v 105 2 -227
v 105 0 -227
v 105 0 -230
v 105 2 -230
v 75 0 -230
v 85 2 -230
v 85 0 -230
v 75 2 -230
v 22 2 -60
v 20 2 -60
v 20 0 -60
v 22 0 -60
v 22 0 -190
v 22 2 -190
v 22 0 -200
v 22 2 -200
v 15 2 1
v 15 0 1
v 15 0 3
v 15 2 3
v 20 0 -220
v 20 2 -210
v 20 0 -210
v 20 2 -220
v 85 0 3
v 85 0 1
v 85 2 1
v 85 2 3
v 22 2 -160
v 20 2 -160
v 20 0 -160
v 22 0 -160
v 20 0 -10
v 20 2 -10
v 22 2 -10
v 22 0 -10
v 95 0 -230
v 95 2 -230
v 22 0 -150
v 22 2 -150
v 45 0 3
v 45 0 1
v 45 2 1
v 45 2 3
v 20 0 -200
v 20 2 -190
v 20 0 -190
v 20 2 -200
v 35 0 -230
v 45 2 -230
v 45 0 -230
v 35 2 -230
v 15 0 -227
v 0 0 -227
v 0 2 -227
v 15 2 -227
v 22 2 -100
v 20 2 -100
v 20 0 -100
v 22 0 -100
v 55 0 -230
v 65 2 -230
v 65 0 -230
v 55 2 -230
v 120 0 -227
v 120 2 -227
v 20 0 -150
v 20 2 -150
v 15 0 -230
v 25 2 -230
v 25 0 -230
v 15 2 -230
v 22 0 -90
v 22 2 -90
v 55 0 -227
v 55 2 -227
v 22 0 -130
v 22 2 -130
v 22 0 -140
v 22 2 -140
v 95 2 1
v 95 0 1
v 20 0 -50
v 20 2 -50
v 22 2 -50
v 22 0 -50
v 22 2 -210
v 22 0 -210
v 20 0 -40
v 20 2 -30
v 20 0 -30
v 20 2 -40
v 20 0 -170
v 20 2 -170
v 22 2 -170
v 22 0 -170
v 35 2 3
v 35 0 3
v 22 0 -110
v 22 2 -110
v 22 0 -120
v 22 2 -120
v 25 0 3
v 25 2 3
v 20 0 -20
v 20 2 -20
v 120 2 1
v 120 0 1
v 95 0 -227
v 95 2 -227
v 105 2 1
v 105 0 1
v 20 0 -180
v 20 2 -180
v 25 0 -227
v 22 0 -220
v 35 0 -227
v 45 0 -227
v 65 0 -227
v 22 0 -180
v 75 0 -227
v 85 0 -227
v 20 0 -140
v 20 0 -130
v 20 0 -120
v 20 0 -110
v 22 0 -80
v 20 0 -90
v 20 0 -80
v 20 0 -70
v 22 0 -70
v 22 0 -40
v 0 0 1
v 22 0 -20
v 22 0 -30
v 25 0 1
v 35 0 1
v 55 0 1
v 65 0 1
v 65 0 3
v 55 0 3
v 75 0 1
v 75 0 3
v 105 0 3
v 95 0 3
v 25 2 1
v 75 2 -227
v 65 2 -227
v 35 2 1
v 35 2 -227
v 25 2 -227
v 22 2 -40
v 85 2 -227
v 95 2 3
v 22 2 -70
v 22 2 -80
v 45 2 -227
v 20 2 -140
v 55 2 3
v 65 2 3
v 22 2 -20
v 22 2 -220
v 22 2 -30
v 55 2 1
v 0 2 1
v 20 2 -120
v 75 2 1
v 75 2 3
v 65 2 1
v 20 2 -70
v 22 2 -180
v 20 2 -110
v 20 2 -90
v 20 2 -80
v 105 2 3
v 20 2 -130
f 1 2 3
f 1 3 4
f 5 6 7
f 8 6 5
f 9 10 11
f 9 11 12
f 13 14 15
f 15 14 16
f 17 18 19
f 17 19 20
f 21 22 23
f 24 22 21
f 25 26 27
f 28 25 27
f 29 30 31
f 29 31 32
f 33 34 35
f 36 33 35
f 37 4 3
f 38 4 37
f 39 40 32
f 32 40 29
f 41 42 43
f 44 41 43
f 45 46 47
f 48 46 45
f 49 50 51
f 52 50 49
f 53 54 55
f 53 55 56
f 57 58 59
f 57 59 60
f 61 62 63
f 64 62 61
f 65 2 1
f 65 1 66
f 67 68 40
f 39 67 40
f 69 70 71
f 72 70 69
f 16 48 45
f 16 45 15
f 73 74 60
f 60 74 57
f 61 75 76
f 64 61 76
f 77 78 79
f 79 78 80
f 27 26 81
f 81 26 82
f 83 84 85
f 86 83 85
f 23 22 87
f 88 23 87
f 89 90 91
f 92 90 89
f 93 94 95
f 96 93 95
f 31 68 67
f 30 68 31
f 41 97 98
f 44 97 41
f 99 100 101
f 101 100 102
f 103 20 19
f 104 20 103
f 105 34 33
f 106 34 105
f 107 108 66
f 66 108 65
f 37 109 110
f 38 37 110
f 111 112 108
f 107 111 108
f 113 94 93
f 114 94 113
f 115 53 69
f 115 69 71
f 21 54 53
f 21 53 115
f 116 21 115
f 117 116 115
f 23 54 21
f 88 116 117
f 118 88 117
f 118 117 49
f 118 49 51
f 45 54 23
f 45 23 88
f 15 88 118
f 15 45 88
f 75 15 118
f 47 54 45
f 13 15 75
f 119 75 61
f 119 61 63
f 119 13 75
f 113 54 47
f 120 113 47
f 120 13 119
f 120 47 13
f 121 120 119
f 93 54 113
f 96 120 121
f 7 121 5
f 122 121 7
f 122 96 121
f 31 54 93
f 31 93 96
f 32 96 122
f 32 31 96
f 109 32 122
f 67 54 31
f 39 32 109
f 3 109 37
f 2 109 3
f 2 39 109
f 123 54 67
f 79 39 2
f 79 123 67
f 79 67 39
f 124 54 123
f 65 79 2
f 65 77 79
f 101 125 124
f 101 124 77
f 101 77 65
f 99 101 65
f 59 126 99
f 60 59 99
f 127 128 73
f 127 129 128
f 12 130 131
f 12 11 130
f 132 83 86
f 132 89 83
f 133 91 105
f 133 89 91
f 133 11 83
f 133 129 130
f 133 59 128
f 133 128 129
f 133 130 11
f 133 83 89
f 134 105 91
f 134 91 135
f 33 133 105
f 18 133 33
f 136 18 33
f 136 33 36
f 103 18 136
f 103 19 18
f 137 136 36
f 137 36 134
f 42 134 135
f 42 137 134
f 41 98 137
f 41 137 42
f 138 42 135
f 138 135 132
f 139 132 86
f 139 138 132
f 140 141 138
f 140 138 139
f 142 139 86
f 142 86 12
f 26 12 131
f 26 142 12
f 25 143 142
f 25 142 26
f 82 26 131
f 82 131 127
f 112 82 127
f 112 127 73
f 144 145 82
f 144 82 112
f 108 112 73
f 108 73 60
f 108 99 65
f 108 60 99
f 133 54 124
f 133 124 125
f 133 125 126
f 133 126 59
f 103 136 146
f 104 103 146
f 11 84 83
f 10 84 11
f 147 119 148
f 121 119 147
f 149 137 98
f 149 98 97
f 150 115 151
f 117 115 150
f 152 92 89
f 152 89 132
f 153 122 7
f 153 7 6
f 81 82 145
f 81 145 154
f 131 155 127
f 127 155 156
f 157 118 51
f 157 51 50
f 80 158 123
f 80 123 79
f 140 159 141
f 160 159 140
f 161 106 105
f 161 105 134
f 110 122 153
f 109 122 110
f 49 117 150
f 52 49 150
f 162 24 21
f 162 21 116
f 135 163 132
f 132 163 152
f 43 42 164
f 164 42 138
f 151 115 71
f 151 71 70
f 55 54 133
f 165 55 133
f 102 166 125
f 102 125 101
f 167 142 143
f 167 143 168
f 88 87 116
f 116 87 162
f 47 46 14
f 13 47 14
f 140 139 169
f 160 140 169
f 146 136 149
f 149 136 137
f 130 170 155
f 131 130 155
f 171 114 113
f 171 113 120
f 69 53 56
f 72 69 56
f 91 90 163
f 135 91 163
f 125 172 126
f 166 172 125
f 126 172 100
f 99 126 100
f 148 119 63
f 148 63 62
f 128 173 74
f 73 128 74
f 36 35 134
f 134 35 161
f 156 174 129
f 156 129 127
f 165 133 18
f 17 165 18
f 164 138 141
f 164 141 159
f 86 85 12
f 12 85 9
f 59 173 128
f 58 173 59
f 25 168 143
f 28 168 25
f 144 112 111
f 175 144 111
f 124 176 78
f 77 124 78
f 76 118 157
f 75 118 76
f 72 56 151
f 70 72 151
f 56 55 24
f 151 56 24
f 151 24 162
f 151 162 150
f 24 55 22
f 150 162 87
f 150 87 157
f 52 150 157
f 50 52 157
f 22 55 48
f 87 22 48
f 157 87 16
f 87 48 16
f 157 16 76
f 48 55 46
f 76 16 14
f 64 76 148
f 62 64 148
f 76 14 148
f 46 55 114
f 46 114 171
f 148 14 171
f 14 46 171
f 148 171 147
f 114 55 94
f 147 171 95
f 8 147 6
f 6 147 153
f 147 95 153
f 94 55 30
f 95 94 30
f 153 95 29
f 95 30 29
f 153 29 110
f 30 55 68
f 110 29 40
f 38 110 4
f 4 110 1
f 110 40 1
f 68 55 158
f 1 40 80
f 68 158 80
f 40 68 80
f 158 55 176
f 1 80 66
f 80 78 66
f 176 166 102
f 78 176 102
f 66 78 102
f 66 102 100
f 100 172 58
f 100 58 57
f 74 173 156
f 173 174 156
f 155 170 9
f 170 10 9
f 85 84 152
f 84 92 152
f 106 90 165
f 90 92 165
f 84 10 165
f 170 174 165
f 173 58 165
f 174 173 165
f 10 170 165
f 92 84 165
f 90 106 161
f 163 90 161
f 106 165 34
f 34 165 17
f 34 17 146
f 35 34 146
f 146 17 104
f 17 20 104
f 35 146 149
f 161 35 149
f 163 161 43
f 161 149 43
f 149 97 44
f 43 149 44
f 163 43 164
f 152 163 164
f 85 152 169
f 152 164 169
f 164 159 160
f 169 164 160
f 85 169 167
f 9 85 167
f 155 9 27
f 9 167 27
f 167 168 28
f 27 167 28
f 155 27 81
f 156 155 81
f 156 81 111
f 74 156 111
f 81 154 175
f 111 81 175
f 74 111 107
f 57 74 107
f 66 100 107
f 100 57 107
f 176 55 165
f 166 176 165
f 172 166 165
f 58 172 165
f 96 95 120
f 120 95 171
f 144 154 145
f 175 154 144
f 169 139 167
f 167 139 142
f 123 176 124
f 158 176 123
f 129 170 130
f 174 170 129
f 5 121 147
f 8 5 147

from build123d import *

# Parameters (mm, degrees)
SKETCH1_W           = 120
SKETCH1_H           = 227
BOSS_EXTRUDE1_DEPTH = 2
SKETCH2_W           = 10
SKETCH2_H           = 2
BOSS_EXTRUDE2_DEPTH = 3
LPATTERN1_COUNT     = 5
LPATTERN1_PITCH     = 20
SKETCH3_W           = 10
SKETCH3_H           = 2
BOSS_EXTRUDE3_DEPTH = 3
LPATTERN2_COUNT     = 5
LPATTERN2_PITCH     = 20
SKETCH4_W           = 3
SKETCH4_H           = 10
CUT_EXTRUDE1_DEPTH  = 3
LPATTERN3_COUNT     = 11
LPATTERN3_PITCH     = 20
ESQUISSE1_W         = 1
ESQUISSE1_H         = 210
BOSS_EXTRU_1_DEPTH  = 2
ESQUISSE2_W         = 120
ESQUISSE2_H         = 1
BOSS_EXTRU_2_DEPTH  = 2


with BuildPart() as part:
    # Sketch1 → Boss-Extrude1 (new body)
    with BuildSketch(Plane(origin=(0, 0, 0), x_dir=(1, 0, 0), z_dir=(0, 1, 0))):
        with Locations((60, 113.5)):
            Rectangle(SKETCH1_W, SKETCH1_H)
    extrude(amount=BOSS_EXTRUDE1_DEPTH)

    # Sketch2 → Boss-Extrude2 (add)
    with BuildSketch(Plane.XY):
        with Locations((20, 1)):
            Rectangle(SKETCH2_W, SKETCH2_H)
    boss_extrude2 = extrude(amount=BOSS_EXTRUDE2_DEPTH)

    # LPattern1: Boss-Extrude2 ×5
    with Locations(*[(i * LPATTERN1_PITCH, 0, 0) for i in range(1, LPATTERN1_COUNT)]):
        add(boss_extrude2)

    # Sketch3 → Boss-Extrude3 (add)
    with BuildSketch(Plane(origin=(0, 0, -227), x_dir=(-1, 0, 0), z_dir=(0, 0, -1))):
        with Locations((-100, 1)):
            Rectangle(SKETCH3_W, SKETCH3_H)
    boss_extrude3 = extrude(amount=BOSS_EXTRUDE3_DEPTH)

    # LPattern2: Boss-Extrude3 ×5
    with Locations(*[(-i * LPATTERN2_PITCH, 0, 0) for i in range(1, LPATTERN2_COUNT)]):
        add(boss_extrude3)

    # Sketch4 → Cut-Extrude1 (cut, through all)
    with BuildSketch(Plane(origin=(0, 2, 0), x_dir=(1, 0, 0), z_dir=(0, 1, 0))):
        with Locations((21.5, 15)):
            Rectangle(SKETCH4_W, SKETCH4_H)
    cut_extrude1 = extrude(amount=-CUT_EXTRUDE1_DEPTH, mode=Mode.SUBTRACT)

    # LPattern3: Cut-Extrude1 ×11
    with Locations(*[(0, 0, -i * LPATTERN3_PITCH) for i in range(1, LPATTERN3_COUNT)]):
        add(cut_extrude1, mode=Mode.SUBTRACT)

    # Esquisse1 → Boss.-Extru.1 (add)
    with BuildSketch(Plane(origin=(0, 2, 0), x_dir=(1, 0, 0), z_dir=(0, 1, 0))):
        with Locations((22.5, 115)):
            Rectangle(ESQUISSE1_W, ESQUISSE1_H)
    extrude(amount=-BOSS_EXTRU_1_DEPTH)

    # Esquisse2 → Boss.-Extru.2 (add)
    with BuildSketch(Plane.XZ):
        with Locations((60, 0.5)):
            Rectangle(ESQUISSE2_W, ESQUISSE2_H)
    extrude(amount=-BOSS_EXTRU_2_DEPTH)


solid = part.part
